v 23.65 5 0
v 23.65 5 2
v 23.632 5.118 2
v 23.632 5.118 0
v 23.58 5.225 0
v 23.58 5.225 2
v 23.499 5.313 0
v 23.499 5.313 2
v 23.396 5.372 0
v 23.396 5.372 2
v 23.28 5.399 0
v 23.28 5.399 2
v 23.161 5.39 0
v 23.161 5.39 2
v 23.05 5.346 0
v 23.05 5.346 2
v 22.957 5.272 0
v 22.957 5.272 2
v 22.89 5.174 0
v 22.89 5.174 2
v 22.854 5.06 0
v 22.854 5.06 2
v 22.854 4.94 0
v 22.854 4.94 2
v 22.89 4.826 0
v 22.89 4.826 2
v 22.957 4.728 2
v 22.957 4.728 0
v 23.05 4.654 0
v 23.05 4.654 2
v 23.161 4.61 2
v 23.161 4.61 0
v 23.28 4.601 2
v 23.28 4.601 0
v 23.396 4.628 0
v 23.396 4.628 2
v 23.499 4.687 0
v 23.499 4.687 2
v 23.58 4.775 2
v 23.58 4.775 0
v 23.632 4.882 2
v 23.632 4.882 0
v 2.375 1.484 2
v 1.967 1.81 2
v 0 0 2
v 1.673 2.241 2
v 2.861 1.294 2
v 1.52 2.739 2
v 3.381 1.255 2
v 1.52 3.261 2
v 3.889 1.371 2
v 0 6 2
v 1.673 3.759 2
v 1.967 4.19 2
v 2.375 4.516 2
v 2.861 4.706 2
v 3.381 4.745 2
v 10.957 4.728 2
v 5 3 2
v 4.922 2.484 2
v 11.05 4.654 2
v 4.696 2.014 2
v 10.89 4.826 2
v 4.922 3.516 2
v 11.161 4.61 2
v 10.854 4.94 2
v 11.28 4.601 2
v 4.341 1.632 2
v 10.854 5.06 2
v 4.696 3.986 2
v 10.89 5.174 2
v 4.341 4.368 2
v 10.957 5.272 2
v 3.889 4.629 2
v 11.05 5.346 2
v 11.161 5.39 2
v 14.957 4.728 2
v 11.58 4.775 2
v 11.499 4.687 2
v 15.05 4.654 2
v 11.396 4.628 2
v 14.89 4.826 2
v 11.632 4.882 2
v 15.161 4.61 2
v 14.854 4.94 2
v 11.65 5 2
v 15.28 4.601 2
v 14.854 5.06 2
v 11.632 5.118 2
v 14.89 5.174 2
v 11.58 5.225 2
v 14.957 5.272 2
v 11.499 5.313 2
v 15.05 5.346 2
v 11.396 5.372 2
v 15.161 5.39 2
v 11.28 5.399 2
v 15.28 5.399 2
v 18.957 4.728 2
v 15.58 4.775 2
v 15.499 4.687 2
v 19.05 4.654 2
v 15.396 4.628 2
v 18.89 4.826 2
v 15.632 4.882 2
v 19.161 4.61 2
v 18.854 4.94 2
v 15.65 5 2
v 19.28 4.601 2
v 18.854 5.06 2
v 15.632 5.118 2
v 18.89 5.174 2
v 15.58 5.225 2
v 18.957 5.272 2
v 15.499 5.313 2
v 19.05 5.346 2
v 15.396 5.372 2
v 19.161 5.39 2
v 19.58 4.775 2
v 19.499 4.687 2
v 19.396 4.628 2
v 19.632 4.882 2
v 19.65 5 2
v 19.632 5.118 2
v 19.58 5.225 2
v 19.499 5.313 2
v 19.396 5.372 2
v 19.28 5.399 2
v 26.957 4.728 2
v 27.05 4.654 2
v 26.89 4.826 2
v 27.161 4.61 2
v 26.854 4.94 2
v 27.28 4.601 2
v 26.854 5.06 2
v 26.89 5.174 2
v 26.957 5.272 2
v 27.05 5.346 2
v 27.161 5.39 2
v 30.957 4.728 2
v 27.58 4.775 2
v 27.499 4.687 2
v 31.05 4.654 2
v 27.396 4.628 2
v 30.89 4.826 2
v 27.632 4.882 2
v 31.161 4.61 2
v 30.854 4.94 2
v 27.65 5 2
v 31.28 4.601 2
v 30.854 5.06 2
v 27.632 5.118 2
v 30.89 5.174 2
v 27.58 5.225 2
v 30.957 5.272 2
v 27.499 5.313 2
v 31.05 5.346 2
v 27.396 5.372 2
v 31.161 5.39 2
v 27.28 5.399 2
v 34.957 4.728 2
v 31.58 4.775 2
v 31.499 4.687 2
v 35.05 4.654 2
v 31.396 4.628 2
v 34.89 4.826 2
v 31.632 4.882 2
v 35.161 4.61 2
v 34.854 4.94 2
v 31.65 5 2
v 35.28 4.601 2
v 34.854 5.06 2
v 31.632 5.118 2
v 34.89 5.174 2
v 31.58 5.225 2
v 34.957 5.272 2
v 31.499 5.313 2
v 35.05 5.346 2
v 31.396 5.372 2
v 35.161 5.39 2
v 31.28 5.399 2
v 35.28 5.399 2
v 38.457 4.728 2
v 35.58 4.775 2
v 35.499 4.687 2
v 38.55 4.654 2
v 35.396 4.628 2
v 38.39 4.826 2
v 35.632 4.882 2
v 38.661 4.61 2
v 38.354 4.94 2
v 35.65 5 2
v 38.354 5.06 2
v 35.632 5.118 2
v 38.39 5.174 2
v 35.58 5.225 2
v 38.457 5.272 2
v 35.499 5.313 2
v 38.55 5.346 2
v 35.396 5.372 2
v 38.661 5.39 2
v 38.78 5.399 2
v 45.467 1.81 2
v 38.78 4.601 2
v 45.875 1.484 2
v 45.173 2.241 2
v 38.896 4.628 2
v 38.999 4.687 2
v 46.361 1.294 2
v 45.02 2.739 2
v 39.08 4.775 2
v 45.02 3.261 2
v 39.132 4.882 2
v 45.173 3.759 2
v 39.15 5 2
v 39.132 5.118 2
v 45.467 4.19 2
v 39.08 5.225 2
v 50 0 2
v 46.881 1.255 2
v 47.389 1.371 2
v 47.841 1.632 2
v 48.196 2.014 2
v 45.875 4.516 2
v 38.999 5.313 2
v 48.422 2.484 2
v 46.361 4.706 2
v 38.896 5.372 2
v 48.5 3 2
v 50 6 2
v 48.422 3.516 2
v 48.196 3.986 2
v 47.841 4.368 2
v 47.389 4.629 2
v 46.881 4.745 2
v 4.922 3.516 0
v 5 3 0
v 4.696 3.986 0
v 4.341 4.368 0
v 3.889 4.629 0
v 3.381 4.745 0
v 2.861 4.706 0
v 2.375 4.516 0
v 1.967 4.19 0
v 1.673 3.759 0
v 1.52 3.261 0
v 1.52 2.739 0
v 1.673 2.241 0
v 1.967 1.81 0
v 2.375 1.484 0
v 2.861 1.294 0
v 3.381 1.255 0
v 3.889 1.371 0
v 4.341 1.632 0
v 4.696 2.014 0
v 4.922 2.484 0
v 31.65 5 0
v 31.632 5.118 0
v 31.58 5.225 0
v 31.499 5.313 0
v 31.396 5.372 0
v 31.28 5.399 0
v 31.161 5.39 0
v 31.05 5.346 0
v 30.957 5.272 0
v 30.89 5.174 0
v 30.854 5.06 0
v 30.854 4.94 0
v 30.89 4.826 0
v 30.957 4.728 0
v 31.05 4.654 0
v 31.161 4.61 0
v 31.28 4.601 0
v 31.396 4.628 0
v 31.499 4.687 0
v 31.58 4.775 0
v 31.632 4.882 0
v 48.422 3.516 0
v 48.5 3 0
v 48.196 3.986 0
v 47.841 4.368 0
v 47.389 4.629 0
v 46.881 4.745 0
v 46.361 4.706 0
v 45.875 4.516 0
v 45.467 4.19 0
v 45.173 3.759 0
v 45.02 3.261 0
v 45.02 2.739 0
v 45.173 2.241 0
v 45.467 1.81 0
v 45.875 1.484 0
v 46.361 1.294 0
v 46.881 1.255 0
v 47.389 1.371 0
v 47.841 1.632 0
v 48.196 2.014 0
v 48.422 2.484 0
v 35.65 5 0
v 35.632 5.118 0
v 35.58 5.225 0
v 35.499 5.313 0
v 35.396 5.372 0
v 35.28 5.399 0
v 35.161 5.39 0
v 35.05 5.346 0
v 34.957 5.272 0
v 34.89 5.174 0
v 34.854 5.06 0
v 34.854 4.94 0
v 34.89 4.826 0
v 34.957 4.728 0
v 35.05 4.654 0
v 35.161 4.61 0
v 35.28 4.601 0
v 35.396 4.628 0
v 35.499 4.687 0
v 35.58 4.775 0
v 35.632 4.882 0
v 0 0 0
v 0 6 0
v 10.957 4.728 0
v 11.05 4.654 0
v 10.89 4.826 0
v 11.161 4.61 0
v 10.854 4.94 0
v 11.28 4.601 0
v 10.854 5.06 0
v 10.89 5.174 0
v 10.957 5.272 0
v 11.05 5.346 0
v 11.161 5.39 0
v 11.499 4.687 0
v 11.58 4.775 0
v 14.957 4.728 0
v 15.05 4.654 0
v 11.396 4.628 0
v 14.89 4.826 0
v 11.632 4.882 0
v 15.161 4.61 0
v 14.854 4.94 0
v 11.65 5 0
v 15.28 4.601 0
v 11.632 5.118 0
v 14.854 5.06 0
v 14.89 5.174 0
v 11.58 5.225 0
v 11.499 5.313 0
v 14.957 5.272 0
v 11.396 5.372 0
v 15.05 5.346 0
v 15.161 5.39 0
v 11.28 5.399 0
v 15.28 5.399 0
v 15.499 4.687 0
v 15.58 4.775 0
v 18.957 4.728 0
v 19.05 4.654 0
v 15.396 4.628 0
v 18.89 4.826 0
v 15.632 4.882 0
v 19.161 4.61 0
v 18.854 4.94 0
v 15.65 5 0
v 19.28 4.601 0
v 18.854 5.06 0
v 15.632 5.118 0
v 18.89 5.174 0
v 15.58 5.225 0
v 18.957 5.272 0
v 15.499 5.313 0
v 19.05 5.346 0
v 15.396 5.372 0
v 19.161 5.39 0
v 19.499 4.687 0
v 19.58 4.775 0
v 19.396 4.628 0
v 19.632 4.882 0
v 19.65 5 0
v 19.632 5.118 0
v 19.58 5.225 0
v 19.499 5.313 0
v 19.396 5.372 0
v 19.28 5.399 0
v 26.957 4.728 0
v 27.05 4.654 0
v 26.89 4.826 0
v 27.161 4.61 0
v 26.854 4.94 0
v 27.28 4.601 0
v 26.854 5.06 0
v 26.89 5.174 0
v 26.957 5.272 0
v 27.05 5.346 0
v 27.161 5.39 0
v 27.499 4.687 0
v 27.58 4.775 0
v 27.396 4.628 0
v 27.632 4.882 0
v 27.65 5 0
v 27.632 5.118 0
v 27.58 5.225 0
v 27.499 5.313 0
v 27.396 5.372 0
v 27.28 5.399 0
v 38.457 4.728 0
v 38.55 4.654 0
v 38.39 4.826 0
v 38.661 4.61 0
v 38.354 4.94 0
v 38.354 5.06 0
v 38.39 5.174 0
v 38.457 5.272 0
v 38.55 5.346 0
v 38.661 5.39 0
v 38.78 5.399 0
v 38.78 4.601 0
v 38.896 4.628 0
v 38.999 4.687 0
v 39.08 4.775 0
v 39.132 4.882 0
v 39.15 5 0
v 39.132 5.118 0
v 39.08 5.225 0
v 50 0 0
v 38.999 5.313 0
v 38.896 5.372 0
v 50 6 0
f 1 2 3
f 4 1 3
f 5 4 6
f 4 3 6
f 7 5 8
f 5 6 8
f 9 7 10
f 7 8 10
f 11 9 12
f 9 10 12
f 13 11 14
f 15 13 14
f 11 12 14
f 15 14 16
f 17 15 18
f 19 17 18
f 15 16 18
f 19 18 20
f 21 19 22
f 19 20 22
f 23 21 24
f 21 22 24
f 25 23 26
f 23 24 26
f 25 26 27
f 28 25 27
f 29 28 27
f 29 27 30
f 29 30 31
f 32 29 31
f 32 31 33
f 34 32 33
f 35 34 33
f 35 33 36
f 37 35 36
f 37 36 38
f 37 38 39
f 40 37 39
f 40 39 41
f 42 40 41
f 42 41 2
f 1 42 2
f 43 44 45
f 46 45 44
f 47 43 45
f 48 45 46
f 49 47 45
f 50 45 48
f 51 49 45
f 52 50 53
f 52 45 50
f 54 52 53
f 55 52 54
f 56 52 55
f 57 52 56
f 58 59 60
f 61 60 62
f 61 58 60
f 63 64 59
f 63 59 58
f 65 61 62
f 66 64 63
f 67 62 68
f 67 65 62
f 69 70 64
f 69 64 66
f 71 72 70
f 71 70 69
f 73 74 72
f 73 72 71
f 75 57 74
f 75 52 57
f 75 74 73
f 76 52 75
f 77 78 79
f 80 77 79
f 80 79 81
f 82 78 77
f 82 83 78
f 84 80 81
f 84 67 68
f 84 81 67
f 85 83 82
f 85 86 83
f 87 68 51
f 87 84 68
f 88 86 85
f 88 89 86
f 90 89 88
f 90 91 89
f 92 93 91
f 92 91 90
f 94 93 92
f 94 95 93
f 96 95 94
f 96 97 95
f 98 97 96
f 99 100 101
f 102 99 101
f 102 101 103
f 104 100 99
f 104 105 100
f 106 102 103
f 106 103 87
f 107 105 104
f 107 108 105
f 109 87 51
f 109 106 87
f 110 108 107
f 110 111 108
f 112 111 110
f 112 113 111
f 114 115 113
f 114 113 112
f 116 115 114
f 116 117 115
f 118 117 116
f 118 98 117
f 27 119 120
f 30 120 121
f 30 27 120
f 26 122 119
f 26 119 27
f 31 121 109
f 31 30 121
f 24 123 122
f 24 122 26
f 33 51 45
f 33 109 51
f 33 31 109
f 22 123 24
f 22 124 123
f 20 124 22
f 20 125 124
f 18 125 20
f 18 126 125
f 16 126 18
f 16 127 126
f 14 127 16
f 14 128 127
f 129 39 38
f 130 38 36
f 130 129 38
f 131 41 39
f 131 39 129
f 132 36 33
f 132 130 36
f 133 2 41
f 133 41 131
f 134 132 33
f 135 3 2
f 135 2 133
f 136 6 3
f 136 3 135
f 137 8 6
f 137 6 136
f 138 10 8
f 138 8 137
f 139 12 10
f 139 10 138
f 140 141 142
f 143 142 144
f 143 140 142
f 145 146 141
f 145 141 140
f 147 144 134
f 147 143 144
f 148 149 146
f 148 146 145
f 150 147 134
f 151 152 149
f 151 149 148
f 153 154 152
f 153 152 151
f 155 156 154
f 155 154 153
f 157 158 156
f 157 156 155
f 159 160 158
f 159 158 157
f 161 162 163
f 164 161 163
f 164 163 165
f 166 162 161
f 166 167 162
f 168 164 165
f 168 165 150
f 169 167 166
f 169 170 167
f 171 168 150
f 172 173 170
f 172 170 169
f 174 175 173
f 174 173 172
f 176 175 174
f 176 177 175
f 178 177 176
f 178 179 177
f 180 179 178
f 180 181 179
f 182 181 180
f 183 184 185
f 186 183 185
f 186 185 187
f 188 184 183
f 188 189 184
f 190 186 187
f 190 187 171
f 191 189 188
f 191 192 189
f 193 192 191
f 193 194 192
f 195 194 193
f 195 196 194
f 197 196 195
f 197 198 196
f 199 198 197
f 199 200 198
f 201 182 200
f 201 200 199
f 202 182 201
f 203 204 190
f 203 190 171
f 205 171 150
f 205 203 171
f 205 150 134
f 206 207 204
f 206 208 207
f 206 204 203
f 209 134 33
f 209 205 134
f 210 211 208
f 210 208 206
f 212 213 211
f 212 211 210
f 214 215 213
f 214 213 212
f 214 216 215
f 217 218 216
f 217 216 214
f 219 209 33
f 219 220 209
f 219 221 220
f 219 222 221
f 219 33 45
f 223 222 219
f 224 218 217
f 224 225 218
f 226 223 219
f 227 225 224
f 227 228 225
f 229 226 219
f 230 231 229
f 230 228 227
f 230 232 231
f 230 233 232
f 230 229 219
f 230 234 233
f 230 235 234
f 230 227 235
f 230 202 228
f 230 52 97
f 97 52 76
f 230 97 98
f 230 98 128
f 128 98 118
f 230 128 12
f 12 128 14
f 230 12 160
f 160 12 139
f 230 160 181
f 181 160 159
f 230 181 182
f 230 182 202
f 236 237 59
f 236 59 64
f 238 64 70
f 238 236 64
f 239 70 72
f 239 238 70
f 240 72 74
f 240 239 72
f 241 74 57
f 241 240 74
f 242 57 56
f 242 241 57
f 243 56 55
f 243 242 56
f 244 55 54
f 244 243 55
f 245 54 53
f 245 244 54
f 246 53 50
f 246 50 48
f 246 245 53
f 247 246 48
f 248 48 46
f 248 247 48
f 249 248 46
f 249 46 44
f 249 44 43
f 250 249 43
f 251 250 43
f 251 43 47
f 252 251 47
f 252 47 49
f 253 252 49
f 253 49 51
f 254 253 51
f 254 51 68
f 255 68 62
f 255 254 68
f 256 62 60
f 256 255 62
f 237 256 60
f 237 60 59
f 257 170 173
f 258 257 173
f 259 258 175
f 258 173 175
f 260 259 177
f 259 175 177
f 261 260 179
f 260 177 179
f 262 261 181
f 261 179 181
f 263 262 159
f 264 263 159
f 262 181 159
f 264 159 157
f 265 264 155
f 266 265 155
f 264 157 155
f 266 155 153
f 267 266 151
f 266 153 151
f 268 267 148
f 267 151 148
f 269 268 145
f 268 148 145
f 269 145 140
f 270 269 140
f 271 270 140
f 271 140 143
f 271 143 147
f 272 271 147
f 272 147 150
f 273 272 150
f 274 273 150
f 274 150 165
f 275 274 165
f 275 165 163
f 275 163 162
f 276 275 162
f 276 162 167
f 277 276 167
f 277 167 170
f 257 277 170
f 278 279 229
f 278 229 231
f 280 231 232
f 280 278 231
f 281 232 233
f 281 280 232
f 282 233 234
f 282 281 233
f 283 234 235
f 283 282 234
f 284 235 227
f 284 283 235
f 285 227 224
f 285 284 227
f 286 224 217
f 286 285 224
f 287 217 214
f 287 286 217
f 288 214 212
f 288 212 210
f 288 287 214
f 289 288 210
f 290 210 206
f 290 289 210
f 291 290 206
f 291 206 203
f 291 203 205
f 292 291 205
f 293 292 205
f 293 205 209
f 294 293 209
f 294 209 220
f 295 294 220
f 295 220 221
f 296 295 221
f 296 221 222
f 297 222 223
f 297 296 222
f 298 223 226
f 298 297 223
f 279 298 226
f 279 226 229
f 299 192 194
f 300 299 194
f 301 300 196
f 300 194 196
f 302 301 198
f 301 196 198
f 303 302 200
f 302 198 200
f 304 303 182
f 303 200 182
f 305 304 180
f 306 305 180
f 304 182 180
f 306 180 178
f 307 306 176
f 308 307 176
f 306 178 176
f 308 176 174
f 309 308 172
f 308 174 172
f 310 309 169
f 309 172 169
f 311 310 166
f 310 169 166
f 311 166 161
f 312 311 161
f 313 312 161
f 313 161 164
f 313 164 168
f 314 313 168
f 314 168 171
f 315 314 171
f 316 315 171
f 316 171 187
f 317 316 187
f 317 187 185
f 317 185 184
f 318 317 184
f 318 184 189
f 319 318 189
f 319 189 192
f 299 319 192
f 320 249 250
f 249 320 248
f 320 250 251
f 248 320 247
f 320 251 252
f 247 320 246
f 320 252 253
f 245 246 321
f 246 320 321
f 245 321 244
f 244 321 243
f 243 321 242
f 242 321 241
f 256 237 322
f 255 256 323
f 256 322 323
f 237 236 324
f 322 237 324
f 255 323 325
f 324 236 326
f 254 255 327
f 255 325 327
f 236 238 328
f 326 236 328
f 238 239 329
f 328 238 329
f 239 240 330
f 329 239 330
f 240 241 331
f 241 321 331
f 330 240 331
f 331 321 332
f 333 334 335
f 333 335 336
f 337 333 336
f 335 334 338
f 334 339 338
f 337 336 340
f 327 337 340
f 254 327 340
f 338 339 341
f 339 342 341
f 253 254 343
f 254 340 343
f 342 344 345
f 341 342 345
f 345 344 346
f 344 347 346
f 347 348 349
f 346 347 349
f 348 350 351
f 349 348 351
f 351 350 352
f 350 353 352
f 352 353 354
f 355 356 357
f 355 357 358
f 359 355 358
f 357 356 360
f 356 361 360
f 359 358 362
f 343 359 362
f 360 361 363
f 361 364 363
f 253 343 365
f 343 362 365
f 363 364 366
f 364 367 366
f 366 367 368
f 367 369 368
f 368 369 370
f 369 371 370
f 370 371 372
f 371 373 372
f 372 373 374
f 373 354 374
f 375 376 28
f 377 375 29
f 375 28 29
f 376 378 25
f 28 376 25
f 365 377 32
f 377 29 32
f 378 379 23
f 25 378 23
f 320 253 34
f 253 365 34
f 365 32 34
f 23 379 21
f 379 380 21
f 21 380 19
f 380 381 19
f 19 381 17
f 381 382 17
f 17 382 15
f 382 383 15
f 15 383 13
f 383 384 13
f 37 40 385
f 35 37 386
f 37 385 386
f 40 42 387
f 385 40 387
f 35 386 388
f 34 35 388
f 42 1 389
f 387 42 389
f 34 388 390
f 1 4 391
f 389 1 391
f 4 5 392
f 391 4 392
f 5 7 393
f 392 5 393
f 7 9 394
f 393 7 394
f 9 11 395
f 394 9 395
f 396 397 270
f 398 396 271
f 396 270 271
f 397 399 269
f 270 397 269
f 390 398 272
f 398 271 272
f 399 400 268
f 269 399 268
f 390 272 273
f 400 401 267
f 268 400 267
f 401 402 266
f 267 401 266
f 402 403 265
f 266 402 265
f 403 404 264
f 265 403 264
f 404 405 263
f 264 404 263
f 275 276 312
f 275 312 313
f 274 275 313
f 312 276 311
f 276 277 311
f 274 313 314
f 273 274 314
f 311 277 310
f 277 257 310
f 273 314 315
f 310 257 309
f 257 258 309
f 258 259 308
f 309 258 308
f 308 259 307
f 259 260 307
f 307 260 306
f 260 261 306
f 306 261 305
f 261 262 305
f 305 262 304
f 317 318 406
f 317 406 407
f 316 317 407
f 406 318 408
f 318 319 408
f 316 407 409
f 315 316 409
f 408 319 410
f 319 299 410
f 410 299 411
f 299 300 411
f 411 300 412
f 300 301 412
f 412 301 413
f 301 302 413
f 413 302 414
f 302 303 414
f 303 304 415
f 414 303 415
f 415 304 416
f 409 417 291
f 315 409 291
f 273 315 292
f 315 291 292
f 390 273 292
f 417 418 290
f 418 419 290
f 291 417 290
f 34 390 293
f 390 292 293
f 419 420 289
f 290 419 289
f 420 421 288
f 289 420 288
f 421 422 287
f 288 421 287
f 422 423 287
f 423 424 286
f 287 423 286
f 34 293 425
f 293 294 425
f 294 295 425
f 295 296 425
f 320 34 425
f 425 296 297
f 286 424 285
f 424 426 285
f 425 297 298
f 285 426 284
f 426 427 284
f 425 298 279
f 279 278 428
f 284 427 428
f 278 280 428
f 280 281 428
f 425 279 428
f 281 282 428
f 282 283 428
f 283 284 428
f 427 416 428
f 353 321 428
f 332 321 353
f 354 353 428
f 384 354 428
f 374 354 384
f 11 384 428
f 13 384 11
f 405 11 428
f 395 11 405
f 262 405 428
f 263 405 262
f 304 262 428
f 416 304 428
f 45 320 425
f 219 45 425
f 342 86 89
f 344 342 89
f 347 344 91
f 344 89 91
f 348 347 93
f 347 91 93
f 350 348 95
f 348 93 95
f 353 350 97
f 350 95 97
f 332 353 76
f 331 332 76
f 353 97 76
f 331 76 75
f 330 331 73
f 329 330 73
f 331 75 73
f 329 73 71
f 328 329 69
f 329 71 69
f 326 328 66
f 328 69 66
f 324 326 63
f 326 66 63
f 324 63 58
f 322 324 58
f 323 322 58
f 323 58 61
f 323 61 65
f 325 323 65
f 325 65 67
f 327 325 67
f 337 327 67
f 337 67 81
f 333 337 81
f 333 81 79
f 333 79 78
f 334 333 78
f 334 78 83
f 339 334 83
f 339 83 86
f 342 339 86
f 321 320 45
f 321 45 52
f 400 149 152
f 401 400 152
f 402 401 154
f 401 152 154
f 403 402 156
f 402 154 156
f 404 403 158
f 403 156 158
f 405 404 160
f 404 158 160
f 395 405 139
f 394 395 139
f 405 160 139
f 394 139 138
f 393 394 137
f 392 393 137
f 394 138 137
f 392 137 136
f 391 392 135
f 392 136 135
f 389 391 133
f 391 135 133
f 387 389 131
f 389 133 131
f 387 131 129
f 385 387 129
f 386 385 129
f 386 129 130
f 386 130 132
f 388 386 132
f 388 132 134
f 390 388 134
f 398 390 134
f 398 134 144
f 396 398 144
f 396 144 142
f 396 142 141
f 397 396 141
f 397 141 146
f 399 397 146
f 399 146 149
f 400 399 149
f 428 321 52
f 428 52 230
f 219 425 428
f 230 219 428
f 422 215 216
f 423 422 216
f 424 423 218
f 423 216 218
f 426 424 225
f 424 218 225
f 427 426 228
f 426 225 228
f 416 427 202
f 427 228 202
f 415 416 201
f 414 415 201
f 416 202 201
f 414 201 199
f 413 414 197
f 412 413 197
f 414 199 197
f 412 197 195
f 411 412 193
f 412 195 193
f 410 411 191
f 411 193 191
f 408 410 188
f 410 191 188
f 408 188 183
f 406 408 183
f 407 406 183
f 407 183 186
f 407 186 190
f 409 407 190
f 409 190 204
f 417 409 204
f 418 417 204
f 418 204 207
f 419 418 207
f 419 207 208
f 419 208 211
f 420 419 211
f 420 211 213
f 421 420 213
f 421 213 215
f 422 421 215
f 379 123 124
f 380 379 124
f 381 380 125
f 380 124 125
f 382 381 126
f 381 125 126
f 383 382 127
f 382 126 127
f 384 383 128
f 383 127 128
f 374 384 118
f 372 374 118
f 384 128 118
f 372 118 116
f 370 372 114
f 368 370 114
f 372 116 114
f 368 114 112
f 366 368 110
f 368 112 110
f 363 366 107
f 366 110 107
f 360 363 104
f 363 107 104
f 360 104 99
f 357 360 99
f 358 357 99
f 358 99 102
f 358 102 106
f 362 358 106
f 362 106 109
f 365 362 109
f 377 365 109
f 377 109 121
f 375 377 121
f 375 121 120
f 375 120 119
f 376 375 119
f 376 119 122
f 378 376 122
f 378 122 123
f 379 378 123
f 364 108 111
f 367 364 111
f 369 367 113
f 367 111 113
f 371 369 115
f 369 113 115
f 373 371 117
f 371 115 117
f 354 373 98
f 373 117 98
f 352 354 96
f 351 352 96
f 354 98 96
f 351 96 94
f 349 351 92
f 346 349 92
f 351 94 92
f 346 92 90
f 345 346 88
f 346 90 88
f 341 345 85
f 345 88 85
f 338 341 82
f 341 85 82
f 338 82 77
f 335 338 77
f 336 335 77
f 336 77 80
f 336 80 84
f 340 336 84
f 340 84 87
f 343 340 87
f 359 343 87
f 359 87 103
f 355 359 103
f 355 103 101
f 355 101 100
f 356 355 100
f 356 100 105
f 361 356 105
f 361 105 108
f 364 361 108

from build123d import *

# Parameters (mm, degrees)
F0_W     = 50
F0_H     = 6
F0_R     = 1.75
F1_DEPTH = 2
F2_R     = 0.4
F3_DEPTH = 2.001


with BuildPart() as f1:
    # F0 (on Top) → F1 (new body)
    with BuildSketch(Plane.XY):
        with Locations((25, 3)):
            Rectangle(F0_W, F0_H)
        with Locations((3.25, 3)):
            Circle(F0_R, mode=Mode.SUBTRACT)
        with Locations((46.75, 3)):
            Circle(F0_R, mode=Mode.SUBTRACT)
    extrude(amount=F1_DEPTH)

    # F2 (on face) → F3 (cut, through all)
    with BuildSketch(Plane.XY.offset(2)):
        with Locations((11.25, 5)):
            Circle(F2_R)
        with Locations((15.25, 5)):
            Circle(F2_R)
        with Locations((19.25, 5)):
            Circle(F2_R)
        with Locations((23.25, 5)):
            Circle(F2_R)
        with Locations((27.25, 5)):
            Circle(F2_R)
        with Locations((31.25, 5)):
            Circle(F2_R)
        with Locations((35.25, 5)):
            Circle(F2_R)
        with Locations((38.75, 5)):
            Circle(F2_R)
    extrude(amount=-F3_DEPTH, mode=Mode.SUBTRACT)


solid = f1.part
